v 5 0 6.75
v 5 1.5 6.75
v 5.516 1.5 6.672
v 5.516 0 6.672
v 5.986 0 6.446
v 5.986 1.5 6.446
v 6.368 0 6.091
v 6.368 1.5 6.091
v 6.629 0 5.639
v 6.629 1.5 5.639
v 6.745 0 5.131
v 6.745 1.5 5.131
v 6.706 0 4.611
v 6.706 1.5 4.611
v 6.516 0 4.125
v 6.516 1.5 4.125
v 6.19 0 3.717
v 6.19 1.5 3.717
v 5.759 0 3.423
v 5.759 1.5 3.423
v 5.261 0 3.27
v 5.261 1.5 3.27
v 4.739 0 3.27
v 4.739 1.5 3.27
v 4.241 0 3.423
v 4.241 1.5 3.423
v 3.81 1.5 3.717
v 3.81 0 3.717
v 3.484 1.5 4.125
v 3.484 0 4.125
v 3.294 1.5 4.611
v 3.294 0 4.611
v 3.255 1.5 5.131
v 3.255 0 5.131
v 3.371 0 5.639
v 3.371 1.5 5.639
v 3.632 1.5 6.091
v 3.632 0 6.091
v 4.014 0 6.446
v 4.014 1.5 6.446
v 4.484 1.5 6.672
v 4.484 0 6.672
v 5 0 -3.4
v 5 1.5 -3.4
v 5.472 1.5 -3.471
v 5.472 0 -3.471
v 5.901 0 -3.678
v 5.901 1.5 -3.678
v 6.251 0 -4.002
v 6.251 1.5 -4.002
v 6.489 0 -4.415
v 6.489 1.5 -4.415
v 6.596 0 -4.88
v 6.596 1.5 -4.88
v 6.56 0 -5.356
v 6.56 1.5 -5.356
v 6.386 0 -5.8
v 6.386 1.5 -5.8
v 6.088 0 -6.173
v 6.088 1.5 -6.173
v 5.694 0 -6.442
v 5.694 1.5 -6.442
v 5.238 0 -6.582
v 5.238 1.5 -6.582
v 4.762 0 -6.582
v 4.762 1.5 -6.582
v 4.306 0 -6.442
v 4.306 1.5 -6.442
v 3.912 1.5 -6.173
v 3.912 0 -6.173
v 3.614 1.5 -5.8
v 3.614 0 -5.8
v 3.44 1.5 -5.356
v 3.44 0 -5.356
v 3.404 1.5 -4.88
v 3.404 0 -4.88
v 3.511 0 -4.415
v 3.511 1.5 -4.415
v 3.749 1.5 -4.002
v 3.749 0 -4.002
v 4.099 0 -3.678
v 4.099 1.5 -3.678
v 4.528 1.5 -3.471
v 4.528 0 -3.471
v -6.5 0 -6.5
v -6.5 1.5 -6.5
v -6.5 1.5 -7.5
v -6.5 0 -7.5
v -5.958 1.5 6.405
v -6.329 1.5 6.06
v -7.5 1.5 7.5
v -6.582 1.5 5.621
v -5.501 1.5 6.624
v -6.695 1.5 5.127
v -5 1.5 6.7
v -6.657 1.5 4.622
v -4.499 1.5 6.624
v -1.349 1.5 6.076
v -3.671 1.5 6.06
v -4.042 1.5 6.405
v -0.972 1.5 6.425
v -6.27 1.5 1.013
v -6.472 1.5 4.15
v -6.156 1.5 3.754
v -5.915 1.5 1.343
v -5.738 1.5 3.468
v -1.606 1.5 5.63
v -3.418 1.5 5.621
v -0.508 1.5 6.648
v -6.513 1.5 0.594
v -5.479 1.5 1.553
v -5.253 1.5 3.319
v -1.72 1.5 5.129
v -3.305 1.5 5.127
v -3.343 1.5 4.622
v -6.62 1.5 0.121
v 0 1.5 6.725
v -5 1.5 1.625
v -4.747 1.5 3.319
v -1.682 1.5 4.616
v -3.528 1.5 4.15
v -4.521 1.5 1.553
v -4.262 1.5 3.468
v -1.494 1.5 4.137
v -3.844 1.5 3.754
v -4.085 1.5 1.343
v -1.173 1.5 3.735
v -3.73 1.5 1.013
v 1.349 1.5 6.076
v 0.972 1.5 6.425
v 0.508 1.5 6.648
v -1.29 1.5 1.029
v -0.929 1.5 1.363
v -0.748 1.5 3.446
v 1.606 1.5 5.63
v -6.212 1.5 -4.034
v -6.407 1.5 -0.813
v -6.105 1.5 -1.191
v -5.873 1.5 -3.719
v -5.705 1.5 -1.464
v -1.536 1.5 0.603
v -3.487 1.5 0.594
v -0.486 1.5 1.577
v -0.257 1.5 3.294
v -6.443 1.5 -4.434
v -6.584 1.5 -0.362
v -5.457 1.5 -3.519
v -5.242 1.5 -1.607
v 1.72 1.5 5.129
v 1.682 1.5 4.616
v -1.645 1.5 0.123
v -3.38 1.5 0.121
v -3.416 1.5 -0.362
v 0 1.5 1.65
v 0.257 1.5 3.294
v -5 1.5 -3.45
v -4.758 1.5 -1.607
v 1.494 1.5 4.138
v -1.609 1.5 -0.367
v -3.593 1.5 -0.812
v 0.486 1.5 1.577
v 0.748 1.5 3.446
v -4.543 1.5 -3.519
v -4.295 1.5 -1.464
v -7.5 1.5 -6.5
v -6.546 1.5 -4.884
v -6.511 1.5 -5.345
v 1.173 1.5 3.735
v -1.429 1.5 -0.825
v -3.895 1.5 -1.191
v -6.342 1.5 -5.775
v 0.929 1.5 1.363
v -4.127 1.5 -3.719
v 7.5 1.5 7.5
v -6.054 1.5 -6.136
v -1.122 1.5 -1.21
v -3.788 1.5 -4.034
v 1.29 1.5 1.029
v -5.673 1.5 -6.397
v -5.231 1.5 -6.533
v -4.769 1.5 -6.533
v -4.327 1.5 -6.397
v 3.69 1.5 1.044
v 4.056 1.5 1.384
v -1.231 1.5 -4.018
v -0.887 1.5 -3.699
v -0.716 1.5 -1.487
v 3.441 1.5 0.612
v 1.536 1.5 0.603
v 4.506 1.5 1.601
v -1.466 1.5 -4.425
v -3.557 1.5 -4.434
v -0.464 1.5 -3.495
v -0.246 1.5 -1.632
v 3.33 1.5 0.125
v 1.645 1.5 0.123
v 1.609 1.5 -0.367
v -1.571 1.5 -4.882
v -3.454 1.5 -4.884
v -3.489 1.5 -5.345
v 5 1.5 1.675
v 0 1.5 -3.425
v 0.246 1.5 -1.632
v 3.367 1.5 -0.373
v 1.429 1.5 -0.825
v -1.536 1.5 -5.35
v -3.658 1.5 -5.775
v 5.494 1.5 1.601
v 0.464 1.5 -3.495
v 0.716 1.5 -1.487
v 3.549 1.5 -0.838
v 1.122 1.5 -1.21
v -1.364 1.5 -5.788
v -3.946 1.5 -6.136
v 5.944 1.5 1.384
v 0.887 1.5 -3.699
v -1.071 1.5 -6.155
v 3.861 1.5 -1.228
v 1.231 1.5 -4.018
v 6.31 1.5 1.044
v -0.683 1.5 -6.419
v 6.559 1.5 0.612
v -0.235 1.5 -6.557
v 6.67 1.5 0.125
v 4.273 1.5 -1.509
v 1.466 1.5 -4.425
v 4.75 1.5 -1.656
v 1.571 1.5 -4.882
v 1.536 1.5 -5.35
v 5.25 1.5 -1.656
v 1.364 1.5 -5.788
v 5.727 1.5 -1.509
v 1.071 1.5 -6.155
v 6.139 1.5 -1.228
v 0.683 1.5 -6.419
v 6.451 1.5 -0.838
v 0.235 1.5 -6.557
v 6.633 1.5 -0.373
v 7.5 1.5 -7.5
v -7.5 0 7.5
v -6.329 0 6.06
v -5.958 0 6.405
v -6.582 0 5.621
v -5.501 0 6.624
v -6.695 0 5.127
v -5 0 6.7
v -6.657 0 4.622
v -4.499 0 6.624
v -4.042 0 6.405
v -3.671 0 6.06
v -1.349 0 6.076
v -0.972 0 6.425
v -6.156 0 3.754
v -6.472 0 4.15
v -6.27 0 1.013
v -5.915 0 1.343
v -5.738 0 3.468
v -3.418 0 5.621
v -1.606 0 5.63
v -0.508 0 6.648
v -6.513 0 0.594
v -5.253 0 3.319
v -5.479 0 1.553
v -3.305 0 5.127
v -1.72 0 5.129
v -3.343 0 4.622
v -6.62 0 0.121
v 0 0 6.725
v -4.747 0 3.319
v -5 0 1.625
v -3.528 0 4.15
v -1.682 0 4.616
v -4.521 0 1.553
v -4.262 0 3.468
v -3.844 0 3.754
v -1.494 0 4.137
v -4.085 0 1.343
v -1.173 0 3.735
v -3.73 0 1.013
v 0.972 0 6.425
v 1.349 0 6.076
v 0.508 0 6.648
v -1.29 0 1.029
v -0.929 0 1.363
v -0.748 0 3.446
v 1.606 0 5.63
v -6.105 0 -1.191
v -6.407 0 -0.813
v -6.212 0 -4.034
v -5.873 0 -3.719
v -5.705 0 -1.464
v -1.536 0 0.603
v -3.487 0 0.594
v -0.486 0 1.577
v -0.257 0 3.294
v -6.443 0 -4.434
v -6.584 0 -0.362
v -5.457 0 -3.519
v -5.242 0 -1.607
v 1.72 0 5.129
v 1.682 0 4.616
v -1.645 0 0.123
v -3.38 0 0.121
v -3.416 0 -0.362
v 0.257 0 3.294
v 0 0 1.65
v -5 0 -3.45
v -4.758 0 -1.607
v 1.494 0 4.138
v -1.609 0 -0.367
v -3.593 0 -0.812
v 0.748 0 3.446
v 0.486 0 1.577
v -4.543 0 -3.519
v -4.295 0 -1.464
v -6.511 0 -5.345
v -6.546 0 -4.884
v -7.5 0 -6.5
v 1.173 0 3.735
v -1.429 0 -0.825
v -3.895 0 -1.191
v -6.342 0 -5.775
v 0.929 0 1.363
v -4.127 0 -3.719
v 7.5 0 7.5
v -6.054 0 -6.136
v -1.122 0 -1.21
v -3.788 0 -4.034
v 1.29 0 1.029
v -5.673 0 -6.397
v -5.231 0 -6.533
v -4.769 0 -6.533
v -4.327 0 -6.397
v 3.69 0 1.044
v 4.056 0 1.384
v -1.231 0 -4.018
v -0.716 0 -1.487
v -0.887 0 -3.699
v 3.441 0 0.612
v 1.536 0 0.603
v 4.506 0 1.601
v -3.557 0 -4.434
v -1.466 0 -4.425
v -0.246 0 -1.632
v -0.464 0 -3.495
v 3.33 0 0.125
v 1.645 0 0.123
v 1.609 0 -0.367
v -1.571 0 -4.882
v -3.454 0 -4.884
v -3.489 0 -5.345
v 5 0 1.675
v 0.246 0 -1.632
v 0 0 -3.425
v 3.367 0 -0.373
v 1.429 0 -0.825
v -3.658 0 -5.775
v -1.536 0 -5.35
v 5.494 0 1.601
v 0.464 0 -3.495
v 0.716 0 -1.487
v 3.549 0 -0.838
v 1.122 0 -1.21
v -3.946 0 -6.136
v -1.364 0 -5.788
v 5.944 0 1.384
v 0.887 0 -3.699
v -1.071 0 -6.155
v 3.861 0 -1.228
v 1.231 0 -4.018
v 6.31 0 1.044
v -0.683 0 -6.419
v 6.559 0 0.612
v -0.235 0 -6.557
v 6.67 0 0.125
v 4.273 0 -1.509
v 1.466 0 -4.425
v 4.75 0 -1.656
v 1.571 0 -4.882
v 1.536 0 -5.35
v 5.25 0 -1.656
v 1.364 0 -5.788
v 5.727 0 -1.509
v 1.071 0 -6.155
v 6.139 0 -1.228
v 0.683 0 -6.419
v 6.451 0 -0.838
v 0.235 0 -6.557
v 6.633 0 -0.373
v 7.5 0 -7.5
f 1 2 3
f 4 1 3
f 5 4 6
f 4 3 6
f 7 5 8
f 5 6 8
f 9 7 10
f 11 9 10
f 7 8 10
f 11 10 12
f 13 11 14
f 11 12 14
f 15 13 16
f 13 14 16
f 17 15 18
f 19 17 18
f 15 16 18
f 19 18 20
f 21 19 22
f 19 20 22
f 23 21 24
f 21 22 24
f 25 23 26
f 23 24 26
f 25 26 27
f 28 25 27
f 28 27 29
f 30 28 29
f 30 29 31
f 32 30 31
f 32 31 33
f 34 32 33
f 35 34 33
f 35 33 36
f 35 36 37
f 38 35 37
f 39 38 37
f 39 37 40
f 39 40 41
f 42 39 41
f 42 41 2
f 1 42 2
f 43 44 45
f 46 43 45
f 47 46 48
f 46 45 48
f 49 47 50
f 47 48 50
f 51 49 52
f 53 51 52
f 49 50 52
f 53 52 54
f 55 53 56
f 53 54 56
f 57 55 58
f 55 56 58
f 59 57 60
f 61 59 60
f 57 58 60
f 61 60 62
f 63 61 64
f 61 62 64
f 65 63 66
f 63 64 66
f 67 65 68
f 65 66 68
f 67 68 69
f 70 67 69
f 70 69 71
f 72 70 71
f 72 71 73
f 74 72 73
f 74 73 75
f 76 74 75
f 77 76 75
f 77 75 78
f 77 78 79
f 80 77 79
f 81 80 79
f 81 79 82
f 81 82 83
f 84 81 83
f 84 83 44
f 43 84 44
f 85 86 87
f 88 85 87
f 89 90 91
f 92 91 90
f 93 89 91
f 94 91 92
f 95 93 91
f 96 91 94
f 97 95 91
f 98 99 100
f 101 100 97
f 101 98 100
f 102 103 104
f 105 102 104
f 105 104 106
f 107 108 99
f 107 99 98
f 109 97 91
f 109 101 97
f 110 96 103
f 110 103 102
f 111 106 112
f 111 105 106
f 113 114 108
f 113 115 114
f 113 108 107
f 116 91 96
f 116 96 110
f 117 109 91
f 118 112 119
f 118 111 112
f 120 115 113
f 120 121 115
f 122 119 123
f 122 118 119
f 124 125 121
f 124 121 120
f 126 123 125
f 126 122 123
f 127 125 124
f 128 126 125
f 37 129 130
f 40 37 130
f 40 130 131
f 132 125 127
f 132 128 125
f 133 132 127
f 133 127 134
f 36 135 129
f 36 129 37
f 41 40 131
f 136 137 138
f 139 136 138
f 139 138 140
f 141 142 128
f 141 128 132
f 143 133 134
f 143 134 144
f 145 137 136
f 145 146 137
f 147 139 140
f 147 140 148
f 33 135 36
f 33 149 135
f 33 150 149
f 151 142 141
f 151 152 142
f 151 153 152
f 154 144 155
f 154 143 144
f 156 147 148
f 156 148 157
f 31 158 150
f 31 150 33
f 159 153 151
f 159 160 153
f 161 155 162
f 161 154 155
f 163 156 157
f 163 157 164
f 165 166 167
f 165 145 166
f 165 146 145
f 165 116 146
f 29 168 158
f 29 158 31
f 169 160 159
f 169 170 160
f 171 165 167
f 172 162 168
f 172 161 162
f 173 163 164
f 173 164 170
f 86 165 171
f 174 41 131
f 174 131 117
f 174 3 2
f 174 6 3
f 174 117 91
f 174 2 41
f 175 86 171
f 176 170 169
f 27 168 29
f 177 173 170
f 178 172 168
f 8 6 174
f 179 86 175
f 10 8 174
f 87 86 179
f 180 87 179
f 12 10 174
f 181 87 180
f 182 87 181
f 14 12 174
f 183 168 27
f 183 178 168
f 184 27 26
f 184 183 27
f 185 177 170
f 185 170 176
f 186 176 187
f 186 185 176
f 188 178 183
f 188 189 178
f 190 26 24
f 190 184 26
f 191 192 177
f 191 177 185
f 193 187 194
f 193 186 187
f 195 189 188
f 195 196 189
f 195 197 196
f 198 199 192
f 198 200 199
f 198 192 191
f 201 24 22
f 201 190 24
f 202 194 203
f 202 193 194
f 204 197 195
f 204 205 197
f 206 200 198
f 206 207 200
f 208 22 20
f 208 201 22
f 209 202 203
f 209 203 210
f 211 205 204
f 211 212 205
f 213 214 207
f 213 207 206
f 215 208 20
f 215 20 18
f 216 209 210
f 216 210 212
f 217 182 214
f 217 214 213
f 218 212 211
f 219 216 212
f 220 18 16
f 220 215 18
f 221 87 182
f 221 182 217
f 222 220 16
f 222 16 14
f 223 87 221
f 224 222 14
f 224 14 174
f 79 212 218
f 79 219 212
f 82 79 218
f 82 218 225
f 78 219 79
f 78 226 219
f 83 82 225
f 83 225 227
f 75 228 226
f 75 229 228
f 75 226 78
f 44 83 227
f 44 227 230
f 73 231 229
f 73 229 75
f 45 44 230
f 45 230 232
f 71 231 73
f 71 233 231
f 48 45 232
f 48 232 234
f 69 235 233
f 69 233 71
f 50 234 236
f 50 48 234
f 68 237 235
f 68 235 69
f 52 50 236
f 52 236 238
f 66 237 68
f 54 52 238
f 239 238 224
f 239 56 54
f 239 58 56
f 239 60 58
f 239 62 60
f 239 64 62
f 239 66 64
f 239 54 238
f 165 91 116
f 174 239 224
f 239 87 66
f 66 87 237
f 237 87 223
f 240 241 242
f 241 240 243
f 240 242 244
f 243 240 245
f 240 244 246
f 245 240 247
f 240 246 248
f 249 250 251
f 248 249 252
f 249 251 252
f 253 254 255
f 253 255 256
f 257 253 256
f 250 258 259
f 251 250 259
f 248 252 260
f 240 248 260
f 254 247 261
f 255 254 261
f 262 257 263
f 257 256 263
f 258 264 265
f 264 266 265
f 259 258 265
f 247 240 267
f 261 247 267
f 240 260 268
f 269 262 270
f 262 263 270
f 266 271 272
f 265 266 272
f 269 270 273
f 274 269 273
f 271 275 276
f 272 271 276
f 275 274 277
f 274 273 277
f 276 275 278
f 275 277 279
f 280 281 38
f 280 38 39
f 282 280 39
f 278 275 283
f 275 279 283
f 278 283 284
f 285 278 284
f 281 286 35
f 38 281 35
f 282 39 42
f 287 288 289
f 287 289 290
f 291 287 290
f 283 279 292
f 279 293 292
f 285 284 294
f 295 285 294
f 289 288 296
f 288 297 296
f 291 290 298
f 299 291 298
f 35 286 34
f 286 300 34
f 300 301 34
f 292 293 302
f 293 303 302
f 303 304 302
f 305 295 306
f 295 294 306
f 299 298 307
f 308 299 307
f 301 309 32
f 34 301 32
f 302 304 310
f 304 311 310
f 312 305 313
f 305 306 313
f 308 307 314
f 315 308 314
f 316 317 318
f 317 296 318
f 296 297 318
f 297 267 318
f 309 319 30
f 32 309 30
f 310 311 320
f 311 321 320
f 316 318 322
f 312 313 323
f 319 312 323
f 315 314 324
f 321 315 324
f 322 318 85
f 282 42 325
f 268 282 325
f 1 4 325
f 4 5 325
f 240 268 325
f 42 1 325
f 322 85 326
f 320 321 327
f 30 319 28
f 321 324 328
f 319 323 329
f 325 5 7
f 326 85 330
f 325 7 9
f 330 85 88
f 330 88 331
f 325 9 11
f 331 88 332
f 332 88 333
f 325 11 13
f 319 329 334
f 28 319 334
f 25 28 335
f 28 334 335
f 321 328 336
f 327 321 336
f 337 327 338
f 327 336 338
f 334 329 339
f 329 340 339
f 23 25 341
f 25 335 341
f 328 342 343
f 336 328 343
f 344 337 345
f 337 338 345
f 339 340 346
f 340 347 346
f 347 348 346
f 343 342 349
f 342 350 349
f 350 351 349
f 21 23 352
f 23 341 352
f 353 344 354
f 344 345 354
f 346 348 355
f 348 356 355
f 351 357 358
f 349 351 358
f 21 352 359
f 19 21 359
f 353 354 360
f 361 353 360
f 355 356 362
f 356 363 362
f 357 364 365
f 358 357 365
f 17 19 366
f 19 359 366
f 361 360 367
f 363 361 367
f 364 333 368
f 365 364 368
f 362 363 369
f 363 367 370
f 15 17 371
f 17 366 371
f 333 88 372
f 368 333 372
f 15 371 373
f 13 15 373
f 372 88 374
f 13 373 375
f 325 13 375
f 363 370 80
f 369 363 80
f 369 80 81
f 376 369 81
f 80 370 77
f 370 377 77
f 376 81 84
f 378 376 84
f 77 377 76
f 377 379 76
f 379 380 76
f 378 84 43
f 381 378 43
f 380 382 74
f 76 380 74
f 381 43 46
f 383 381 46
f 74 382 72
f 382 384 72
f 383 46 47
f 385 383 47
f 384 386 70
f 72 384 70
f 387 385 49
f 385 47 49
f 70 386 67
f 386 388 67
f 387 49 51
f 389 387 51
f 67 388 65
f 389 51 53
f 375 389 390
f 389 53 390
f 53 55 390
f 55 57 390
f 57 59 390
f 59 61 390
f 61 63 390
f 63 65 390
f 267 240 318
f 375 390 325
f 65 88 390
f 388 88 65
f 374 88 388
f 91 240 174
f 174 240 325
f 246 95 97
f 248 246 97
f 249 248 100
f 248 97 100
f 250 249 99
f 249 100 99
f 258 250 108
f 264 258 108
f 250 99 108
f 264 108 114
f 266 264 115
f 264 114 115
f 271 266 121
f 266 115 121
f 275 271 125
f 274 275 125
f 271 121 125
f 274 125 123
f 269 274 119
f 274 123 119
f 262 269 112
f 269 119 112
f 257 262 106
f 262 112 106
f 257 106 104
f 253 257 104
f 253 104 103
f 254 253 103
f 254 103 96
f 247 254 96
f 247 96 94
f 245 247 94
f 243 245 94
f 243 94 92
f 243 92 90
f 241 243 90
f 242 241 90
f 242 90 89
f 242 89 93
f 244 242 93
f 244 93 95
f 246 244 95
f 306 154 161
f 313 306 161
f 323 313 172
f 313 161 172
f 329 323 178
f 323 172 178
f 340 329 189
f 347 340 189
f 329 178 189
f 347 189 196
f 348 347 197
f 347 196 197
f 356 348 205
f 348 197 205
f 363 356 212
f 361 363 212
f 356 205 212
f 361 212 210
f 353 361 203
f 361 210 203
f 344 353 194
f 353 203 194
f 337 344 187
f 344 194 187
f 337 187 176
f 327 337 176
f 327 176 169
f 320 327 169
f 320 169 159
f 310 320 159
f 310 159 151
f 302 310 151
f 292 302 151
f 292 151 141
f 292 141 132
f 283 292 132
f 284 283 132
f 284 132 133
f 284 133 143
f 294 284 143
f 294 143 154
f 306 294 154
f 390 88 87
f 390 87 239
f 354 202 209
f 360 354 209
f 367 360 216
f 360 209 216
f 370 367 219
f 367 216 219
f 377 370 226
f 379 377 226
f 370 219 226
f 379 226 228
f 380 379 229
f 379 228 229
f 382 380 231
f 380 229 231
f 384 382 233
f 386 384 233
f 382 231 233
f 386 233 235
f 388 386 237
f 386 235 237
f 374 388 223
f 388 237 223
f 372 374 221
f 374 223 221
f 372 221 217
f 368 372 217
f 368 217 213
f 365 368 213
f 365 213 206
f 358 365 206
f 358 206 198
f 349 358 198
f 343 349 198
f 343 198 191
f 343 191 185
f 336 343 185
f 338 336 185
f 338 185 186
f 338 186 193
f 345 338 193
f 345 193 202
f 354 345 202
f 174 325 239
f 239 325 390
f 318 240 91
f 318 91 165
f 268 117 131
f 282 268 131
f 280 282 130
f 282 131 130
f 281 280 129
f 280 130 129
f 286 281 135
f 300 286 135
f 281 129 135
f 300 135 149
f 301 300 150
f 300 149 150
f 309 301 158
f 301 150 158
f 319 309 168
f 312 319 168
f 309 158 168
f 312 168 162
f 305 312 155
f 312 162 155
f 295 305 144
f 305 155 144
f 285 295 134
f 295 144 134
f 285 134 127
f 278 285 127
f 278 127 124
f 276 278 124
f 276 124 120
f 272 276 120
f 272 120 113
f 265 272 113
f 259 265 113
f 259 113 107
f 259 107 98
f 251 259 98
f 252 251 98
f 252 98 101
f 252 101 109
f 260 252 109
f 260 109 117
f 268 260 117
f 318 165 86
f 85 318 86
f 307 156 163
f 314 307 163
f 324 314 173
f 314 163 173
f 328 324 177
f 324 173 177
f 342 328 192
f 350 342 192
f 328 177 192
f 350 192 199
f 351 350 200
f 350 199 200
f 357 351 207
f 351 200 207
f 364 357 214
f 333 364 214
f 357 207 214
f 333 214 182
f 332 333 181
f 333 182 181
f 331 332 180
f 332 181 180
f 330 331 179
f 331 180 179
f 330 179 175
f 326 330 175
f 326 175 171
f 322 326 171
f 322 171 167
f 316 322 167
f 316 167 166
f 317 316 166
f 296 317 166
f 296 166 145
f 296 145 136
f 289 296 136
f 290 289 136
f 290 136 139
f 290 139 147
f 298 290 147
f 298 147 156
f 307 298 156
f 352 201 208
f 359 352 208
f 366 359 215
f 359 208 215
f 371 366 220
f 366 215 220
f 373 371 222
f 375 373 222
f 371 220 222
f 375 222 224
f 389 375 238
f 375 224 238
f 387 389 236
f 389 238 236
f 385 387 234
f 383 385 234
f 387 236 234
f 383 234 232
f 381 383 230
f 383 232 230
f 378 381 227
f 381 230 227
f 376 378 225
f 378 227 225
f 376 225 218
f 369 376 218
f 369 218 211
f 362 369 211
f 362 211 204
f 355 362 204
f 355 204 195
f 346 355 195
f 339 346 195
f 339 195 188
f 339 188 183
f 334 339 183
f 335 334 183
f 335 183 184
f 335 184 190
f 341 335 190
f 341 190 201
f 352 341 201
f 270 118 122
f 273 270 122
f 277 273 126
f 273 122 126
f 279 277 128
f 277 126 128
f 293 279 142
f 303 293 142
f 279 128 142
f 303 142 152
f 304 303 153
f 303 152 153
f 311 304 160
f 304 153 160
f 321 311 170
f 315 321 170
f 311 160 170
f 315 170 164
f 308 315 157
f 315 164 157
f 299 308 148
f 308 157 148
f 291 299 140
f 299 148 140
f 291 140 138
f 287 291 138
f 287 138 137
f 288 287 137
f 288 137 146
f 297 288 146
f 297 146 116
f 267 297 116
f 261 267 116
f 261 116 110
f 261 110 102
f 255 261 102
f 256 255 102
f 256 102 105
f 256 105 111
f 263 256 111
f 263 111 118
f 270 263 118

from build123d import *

# Parameters (mm, degrees)
SKETCH1_W           = 15
SKETCH1_H           = 15
BOSS_EXTRUDE1_DEPTH = 1.5
SKETCH2_R           = 1.55
SKETCH2_R_2         = 1.575
SKETCH2_R_3         = 1.6
SKETCH2_R_4         = 1.625
SKETCH2_R_5         = 1.65
SKETCH2_R_6         = 1.675
SKETCH2_R_7         = 1.7
SKETCH2_R_8         = 1.725
SKETCH2_R_9         = 1.75
CUT_EXTRUDE1_DEPTH  = 10
SKETCH4_W           = 1
SKETCH4_H           = 1
CUT_EXTRUDE2_DEPTH  = 10


with BuildPart() as part:
    # Sketch1 → Boss-Extrude1 (new body)
    with BuildSketch(Plane(origin=(0, 0, 0), x_dir=(1, 0, 0), z_dir=(0, 1, 0))):
        Rectangle(SKETCH1_W, SKETCH1_H)
    extrude(amount=BOSS_EXTRUDE1_DEPTH)

    # Sketch2 → Cut-Extrude1 (cut)
    with BuildSketch(Plane(origin=(0, 1.5, 0), x_dir=(1, 0, 0), z_dir=(0, 1, 0))):
        with Locations((-5, 5)):
            Circle(SKETCH2_R)
        with Locations((0, 5)):
            Circle(SKETCH2_R_2)
        with Locations((5, 5)):
            Circle(SKETCH2_R_3)
        with Locations((-5, 0)):
            Circle(SKETCH2_R_4)
        Circle(SKETCH2_R_5)
        with Locations((5, 0)):
            Circle(SKETCH2_R_6)
        with Locations((-5, -5)):
            Circle(SKETCH2_R_7)
        with Locations((0, -5)):
            Circle(SKETCH2_R_8)
        with Locations((5, -5)):
            Circle(SKETCH2_R_9)
    extrude(amount=-CUT_EXTRUDE1_DEPTH, mode=Mode.SUBTRACT)

    # Sketch4 → Cut-Extrude2 (cut)
    with BuildSketch(Plane(origin=(0, 1.5, 0), x_dir=(1, 0, 0), z_dir=(0, 1, 0))):
        with Locations((-7, 7)):
            Rectangle(SKETCH4_W, SKETCH4_H)
    extrude(amount=-CUT_EXTRUDE2_DEPTH, mode=Mode.SUBTRACT)


solid = part.part
